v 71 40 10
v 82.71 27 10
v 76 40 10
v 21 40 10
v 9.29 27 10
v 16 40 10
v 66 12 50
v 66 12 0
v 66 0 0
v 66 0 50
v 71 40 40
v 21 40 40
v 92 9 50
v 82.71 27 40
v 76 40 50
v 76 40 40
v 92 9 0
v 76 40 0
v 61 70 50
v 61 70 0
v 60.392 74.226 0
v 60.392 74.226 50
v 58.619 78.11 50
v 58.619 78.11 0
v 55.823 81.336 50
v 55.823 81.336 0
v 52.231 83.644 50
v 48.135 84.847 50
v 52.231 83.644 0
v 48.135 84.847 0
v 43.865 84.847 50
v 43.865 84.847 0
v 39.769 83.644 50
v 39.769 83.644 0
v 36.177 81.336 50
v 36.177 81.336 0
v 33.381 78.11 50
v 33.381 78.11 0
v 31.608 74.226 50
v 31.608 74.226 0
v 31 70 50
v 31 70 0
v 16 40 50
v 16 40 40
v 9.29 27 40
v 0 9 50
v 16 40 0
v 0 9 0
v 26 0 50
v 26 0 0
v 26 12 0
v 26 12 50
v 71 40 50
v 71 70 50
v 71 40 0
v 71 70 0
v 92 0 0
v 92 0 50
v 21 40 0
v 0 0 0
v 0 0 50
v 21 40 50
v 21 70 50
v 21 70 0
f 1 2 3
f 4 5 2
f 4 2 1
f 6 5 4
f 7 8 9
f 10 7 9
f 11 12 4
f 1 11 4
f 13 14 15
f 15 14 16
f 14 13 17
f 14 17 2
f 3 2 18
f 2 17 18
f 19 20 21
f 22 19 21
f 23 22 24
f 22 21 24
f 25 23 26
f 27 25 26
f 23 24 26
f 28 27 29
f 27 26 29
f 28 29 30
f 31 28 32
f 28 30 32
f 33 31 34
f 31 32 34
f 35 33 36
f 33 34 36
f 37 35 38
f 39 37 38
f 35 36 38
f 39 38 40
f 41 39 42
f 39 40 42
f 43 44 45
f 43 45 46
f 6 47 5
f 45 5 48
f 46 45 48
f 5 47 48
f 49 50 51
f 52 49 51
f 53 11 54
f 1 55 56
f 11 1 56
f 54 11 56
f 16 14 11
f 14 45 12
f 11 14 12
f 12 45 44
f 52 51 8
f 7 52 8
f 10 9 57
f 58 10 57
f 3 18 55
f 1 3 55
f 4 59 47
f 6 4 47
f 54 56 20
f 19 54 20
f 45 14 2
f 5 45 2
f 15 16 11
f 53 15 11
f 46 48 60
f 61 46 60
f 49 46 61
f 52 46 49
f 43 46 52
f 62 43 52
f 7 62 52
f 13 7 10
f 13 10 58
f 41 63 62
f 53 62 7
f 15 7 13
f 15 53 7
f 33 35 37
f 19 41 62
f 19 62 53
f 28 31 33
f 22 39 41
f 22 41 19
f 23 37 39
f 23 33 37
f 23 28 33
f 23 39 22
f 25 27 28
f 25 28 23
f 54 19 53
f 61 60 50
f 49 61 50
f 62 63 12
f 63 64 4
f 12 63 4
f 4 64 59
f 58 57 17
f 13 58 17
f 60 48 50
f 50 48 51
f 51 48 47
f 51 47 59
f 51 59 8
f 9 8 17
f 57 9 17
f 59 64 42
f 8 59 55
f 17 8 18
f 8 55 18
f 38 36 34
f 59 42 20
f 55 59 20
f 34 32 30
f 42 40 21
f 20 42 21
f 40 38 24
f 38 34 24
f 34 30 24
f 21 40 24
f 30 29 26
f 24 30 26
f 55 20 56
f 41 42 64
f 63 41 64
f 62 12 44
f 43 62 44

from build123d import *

# Parameters (mm, degrees)
BOSS_EXTRUDE1_DEPTH = 50
SKETCH5_W           = 30
SKETCH5_H           = 13
CUT_EXTRUDE1_DEPTH  = 135.866600758


with BuildPart() as part:
    # Sketch1 → Boss-Extrude1 (new body)
    with BuildSketch(Plane.XY):
        with BuildLine():
            Line((0, 0), (26, 0))
            Line((26, 0), (26, 12))
            Line((26, 12), (66, 12))
            Line((66, 12), (66, 0))
            Line((66, 0), (92, 0))
            Line((92, 0), (92, 9))
            Line((92, 9), (76, 40))
            Line((76, 40), (71, 40))
            Line((71, 40), (71, 70))
            Line((71, 70), (61, 70))
            ThreePointArc((61, 70), (46, 85), (31, 70))
            Line((31, 70), (21, 70))
            Line((21, 70), (21, 40))
            Line((21, 40), (16, 40))
            Line((16, 40), (0, 9))
            Line((0, 9), (0, 0))
        make_face()
    extrude(amount=BOSS_EXTRUDE1_DEPTH)

    # Sketch5 → Cut-Extrude1 (cut, through all)
    with BuildSketch(Plane(origin=(0, 0, 0), x_dir=(0, 0, -1), z_dir=(1, 0, 0))):
        with Locations((-25, 33.5)):
            Rectangle(SKETCH5_W, SKETCH5_H)
    extrude(amount=CUT_EXTRUDE1_DEPTH, mode=Mode.SUBTRACT)


solid = part.part
